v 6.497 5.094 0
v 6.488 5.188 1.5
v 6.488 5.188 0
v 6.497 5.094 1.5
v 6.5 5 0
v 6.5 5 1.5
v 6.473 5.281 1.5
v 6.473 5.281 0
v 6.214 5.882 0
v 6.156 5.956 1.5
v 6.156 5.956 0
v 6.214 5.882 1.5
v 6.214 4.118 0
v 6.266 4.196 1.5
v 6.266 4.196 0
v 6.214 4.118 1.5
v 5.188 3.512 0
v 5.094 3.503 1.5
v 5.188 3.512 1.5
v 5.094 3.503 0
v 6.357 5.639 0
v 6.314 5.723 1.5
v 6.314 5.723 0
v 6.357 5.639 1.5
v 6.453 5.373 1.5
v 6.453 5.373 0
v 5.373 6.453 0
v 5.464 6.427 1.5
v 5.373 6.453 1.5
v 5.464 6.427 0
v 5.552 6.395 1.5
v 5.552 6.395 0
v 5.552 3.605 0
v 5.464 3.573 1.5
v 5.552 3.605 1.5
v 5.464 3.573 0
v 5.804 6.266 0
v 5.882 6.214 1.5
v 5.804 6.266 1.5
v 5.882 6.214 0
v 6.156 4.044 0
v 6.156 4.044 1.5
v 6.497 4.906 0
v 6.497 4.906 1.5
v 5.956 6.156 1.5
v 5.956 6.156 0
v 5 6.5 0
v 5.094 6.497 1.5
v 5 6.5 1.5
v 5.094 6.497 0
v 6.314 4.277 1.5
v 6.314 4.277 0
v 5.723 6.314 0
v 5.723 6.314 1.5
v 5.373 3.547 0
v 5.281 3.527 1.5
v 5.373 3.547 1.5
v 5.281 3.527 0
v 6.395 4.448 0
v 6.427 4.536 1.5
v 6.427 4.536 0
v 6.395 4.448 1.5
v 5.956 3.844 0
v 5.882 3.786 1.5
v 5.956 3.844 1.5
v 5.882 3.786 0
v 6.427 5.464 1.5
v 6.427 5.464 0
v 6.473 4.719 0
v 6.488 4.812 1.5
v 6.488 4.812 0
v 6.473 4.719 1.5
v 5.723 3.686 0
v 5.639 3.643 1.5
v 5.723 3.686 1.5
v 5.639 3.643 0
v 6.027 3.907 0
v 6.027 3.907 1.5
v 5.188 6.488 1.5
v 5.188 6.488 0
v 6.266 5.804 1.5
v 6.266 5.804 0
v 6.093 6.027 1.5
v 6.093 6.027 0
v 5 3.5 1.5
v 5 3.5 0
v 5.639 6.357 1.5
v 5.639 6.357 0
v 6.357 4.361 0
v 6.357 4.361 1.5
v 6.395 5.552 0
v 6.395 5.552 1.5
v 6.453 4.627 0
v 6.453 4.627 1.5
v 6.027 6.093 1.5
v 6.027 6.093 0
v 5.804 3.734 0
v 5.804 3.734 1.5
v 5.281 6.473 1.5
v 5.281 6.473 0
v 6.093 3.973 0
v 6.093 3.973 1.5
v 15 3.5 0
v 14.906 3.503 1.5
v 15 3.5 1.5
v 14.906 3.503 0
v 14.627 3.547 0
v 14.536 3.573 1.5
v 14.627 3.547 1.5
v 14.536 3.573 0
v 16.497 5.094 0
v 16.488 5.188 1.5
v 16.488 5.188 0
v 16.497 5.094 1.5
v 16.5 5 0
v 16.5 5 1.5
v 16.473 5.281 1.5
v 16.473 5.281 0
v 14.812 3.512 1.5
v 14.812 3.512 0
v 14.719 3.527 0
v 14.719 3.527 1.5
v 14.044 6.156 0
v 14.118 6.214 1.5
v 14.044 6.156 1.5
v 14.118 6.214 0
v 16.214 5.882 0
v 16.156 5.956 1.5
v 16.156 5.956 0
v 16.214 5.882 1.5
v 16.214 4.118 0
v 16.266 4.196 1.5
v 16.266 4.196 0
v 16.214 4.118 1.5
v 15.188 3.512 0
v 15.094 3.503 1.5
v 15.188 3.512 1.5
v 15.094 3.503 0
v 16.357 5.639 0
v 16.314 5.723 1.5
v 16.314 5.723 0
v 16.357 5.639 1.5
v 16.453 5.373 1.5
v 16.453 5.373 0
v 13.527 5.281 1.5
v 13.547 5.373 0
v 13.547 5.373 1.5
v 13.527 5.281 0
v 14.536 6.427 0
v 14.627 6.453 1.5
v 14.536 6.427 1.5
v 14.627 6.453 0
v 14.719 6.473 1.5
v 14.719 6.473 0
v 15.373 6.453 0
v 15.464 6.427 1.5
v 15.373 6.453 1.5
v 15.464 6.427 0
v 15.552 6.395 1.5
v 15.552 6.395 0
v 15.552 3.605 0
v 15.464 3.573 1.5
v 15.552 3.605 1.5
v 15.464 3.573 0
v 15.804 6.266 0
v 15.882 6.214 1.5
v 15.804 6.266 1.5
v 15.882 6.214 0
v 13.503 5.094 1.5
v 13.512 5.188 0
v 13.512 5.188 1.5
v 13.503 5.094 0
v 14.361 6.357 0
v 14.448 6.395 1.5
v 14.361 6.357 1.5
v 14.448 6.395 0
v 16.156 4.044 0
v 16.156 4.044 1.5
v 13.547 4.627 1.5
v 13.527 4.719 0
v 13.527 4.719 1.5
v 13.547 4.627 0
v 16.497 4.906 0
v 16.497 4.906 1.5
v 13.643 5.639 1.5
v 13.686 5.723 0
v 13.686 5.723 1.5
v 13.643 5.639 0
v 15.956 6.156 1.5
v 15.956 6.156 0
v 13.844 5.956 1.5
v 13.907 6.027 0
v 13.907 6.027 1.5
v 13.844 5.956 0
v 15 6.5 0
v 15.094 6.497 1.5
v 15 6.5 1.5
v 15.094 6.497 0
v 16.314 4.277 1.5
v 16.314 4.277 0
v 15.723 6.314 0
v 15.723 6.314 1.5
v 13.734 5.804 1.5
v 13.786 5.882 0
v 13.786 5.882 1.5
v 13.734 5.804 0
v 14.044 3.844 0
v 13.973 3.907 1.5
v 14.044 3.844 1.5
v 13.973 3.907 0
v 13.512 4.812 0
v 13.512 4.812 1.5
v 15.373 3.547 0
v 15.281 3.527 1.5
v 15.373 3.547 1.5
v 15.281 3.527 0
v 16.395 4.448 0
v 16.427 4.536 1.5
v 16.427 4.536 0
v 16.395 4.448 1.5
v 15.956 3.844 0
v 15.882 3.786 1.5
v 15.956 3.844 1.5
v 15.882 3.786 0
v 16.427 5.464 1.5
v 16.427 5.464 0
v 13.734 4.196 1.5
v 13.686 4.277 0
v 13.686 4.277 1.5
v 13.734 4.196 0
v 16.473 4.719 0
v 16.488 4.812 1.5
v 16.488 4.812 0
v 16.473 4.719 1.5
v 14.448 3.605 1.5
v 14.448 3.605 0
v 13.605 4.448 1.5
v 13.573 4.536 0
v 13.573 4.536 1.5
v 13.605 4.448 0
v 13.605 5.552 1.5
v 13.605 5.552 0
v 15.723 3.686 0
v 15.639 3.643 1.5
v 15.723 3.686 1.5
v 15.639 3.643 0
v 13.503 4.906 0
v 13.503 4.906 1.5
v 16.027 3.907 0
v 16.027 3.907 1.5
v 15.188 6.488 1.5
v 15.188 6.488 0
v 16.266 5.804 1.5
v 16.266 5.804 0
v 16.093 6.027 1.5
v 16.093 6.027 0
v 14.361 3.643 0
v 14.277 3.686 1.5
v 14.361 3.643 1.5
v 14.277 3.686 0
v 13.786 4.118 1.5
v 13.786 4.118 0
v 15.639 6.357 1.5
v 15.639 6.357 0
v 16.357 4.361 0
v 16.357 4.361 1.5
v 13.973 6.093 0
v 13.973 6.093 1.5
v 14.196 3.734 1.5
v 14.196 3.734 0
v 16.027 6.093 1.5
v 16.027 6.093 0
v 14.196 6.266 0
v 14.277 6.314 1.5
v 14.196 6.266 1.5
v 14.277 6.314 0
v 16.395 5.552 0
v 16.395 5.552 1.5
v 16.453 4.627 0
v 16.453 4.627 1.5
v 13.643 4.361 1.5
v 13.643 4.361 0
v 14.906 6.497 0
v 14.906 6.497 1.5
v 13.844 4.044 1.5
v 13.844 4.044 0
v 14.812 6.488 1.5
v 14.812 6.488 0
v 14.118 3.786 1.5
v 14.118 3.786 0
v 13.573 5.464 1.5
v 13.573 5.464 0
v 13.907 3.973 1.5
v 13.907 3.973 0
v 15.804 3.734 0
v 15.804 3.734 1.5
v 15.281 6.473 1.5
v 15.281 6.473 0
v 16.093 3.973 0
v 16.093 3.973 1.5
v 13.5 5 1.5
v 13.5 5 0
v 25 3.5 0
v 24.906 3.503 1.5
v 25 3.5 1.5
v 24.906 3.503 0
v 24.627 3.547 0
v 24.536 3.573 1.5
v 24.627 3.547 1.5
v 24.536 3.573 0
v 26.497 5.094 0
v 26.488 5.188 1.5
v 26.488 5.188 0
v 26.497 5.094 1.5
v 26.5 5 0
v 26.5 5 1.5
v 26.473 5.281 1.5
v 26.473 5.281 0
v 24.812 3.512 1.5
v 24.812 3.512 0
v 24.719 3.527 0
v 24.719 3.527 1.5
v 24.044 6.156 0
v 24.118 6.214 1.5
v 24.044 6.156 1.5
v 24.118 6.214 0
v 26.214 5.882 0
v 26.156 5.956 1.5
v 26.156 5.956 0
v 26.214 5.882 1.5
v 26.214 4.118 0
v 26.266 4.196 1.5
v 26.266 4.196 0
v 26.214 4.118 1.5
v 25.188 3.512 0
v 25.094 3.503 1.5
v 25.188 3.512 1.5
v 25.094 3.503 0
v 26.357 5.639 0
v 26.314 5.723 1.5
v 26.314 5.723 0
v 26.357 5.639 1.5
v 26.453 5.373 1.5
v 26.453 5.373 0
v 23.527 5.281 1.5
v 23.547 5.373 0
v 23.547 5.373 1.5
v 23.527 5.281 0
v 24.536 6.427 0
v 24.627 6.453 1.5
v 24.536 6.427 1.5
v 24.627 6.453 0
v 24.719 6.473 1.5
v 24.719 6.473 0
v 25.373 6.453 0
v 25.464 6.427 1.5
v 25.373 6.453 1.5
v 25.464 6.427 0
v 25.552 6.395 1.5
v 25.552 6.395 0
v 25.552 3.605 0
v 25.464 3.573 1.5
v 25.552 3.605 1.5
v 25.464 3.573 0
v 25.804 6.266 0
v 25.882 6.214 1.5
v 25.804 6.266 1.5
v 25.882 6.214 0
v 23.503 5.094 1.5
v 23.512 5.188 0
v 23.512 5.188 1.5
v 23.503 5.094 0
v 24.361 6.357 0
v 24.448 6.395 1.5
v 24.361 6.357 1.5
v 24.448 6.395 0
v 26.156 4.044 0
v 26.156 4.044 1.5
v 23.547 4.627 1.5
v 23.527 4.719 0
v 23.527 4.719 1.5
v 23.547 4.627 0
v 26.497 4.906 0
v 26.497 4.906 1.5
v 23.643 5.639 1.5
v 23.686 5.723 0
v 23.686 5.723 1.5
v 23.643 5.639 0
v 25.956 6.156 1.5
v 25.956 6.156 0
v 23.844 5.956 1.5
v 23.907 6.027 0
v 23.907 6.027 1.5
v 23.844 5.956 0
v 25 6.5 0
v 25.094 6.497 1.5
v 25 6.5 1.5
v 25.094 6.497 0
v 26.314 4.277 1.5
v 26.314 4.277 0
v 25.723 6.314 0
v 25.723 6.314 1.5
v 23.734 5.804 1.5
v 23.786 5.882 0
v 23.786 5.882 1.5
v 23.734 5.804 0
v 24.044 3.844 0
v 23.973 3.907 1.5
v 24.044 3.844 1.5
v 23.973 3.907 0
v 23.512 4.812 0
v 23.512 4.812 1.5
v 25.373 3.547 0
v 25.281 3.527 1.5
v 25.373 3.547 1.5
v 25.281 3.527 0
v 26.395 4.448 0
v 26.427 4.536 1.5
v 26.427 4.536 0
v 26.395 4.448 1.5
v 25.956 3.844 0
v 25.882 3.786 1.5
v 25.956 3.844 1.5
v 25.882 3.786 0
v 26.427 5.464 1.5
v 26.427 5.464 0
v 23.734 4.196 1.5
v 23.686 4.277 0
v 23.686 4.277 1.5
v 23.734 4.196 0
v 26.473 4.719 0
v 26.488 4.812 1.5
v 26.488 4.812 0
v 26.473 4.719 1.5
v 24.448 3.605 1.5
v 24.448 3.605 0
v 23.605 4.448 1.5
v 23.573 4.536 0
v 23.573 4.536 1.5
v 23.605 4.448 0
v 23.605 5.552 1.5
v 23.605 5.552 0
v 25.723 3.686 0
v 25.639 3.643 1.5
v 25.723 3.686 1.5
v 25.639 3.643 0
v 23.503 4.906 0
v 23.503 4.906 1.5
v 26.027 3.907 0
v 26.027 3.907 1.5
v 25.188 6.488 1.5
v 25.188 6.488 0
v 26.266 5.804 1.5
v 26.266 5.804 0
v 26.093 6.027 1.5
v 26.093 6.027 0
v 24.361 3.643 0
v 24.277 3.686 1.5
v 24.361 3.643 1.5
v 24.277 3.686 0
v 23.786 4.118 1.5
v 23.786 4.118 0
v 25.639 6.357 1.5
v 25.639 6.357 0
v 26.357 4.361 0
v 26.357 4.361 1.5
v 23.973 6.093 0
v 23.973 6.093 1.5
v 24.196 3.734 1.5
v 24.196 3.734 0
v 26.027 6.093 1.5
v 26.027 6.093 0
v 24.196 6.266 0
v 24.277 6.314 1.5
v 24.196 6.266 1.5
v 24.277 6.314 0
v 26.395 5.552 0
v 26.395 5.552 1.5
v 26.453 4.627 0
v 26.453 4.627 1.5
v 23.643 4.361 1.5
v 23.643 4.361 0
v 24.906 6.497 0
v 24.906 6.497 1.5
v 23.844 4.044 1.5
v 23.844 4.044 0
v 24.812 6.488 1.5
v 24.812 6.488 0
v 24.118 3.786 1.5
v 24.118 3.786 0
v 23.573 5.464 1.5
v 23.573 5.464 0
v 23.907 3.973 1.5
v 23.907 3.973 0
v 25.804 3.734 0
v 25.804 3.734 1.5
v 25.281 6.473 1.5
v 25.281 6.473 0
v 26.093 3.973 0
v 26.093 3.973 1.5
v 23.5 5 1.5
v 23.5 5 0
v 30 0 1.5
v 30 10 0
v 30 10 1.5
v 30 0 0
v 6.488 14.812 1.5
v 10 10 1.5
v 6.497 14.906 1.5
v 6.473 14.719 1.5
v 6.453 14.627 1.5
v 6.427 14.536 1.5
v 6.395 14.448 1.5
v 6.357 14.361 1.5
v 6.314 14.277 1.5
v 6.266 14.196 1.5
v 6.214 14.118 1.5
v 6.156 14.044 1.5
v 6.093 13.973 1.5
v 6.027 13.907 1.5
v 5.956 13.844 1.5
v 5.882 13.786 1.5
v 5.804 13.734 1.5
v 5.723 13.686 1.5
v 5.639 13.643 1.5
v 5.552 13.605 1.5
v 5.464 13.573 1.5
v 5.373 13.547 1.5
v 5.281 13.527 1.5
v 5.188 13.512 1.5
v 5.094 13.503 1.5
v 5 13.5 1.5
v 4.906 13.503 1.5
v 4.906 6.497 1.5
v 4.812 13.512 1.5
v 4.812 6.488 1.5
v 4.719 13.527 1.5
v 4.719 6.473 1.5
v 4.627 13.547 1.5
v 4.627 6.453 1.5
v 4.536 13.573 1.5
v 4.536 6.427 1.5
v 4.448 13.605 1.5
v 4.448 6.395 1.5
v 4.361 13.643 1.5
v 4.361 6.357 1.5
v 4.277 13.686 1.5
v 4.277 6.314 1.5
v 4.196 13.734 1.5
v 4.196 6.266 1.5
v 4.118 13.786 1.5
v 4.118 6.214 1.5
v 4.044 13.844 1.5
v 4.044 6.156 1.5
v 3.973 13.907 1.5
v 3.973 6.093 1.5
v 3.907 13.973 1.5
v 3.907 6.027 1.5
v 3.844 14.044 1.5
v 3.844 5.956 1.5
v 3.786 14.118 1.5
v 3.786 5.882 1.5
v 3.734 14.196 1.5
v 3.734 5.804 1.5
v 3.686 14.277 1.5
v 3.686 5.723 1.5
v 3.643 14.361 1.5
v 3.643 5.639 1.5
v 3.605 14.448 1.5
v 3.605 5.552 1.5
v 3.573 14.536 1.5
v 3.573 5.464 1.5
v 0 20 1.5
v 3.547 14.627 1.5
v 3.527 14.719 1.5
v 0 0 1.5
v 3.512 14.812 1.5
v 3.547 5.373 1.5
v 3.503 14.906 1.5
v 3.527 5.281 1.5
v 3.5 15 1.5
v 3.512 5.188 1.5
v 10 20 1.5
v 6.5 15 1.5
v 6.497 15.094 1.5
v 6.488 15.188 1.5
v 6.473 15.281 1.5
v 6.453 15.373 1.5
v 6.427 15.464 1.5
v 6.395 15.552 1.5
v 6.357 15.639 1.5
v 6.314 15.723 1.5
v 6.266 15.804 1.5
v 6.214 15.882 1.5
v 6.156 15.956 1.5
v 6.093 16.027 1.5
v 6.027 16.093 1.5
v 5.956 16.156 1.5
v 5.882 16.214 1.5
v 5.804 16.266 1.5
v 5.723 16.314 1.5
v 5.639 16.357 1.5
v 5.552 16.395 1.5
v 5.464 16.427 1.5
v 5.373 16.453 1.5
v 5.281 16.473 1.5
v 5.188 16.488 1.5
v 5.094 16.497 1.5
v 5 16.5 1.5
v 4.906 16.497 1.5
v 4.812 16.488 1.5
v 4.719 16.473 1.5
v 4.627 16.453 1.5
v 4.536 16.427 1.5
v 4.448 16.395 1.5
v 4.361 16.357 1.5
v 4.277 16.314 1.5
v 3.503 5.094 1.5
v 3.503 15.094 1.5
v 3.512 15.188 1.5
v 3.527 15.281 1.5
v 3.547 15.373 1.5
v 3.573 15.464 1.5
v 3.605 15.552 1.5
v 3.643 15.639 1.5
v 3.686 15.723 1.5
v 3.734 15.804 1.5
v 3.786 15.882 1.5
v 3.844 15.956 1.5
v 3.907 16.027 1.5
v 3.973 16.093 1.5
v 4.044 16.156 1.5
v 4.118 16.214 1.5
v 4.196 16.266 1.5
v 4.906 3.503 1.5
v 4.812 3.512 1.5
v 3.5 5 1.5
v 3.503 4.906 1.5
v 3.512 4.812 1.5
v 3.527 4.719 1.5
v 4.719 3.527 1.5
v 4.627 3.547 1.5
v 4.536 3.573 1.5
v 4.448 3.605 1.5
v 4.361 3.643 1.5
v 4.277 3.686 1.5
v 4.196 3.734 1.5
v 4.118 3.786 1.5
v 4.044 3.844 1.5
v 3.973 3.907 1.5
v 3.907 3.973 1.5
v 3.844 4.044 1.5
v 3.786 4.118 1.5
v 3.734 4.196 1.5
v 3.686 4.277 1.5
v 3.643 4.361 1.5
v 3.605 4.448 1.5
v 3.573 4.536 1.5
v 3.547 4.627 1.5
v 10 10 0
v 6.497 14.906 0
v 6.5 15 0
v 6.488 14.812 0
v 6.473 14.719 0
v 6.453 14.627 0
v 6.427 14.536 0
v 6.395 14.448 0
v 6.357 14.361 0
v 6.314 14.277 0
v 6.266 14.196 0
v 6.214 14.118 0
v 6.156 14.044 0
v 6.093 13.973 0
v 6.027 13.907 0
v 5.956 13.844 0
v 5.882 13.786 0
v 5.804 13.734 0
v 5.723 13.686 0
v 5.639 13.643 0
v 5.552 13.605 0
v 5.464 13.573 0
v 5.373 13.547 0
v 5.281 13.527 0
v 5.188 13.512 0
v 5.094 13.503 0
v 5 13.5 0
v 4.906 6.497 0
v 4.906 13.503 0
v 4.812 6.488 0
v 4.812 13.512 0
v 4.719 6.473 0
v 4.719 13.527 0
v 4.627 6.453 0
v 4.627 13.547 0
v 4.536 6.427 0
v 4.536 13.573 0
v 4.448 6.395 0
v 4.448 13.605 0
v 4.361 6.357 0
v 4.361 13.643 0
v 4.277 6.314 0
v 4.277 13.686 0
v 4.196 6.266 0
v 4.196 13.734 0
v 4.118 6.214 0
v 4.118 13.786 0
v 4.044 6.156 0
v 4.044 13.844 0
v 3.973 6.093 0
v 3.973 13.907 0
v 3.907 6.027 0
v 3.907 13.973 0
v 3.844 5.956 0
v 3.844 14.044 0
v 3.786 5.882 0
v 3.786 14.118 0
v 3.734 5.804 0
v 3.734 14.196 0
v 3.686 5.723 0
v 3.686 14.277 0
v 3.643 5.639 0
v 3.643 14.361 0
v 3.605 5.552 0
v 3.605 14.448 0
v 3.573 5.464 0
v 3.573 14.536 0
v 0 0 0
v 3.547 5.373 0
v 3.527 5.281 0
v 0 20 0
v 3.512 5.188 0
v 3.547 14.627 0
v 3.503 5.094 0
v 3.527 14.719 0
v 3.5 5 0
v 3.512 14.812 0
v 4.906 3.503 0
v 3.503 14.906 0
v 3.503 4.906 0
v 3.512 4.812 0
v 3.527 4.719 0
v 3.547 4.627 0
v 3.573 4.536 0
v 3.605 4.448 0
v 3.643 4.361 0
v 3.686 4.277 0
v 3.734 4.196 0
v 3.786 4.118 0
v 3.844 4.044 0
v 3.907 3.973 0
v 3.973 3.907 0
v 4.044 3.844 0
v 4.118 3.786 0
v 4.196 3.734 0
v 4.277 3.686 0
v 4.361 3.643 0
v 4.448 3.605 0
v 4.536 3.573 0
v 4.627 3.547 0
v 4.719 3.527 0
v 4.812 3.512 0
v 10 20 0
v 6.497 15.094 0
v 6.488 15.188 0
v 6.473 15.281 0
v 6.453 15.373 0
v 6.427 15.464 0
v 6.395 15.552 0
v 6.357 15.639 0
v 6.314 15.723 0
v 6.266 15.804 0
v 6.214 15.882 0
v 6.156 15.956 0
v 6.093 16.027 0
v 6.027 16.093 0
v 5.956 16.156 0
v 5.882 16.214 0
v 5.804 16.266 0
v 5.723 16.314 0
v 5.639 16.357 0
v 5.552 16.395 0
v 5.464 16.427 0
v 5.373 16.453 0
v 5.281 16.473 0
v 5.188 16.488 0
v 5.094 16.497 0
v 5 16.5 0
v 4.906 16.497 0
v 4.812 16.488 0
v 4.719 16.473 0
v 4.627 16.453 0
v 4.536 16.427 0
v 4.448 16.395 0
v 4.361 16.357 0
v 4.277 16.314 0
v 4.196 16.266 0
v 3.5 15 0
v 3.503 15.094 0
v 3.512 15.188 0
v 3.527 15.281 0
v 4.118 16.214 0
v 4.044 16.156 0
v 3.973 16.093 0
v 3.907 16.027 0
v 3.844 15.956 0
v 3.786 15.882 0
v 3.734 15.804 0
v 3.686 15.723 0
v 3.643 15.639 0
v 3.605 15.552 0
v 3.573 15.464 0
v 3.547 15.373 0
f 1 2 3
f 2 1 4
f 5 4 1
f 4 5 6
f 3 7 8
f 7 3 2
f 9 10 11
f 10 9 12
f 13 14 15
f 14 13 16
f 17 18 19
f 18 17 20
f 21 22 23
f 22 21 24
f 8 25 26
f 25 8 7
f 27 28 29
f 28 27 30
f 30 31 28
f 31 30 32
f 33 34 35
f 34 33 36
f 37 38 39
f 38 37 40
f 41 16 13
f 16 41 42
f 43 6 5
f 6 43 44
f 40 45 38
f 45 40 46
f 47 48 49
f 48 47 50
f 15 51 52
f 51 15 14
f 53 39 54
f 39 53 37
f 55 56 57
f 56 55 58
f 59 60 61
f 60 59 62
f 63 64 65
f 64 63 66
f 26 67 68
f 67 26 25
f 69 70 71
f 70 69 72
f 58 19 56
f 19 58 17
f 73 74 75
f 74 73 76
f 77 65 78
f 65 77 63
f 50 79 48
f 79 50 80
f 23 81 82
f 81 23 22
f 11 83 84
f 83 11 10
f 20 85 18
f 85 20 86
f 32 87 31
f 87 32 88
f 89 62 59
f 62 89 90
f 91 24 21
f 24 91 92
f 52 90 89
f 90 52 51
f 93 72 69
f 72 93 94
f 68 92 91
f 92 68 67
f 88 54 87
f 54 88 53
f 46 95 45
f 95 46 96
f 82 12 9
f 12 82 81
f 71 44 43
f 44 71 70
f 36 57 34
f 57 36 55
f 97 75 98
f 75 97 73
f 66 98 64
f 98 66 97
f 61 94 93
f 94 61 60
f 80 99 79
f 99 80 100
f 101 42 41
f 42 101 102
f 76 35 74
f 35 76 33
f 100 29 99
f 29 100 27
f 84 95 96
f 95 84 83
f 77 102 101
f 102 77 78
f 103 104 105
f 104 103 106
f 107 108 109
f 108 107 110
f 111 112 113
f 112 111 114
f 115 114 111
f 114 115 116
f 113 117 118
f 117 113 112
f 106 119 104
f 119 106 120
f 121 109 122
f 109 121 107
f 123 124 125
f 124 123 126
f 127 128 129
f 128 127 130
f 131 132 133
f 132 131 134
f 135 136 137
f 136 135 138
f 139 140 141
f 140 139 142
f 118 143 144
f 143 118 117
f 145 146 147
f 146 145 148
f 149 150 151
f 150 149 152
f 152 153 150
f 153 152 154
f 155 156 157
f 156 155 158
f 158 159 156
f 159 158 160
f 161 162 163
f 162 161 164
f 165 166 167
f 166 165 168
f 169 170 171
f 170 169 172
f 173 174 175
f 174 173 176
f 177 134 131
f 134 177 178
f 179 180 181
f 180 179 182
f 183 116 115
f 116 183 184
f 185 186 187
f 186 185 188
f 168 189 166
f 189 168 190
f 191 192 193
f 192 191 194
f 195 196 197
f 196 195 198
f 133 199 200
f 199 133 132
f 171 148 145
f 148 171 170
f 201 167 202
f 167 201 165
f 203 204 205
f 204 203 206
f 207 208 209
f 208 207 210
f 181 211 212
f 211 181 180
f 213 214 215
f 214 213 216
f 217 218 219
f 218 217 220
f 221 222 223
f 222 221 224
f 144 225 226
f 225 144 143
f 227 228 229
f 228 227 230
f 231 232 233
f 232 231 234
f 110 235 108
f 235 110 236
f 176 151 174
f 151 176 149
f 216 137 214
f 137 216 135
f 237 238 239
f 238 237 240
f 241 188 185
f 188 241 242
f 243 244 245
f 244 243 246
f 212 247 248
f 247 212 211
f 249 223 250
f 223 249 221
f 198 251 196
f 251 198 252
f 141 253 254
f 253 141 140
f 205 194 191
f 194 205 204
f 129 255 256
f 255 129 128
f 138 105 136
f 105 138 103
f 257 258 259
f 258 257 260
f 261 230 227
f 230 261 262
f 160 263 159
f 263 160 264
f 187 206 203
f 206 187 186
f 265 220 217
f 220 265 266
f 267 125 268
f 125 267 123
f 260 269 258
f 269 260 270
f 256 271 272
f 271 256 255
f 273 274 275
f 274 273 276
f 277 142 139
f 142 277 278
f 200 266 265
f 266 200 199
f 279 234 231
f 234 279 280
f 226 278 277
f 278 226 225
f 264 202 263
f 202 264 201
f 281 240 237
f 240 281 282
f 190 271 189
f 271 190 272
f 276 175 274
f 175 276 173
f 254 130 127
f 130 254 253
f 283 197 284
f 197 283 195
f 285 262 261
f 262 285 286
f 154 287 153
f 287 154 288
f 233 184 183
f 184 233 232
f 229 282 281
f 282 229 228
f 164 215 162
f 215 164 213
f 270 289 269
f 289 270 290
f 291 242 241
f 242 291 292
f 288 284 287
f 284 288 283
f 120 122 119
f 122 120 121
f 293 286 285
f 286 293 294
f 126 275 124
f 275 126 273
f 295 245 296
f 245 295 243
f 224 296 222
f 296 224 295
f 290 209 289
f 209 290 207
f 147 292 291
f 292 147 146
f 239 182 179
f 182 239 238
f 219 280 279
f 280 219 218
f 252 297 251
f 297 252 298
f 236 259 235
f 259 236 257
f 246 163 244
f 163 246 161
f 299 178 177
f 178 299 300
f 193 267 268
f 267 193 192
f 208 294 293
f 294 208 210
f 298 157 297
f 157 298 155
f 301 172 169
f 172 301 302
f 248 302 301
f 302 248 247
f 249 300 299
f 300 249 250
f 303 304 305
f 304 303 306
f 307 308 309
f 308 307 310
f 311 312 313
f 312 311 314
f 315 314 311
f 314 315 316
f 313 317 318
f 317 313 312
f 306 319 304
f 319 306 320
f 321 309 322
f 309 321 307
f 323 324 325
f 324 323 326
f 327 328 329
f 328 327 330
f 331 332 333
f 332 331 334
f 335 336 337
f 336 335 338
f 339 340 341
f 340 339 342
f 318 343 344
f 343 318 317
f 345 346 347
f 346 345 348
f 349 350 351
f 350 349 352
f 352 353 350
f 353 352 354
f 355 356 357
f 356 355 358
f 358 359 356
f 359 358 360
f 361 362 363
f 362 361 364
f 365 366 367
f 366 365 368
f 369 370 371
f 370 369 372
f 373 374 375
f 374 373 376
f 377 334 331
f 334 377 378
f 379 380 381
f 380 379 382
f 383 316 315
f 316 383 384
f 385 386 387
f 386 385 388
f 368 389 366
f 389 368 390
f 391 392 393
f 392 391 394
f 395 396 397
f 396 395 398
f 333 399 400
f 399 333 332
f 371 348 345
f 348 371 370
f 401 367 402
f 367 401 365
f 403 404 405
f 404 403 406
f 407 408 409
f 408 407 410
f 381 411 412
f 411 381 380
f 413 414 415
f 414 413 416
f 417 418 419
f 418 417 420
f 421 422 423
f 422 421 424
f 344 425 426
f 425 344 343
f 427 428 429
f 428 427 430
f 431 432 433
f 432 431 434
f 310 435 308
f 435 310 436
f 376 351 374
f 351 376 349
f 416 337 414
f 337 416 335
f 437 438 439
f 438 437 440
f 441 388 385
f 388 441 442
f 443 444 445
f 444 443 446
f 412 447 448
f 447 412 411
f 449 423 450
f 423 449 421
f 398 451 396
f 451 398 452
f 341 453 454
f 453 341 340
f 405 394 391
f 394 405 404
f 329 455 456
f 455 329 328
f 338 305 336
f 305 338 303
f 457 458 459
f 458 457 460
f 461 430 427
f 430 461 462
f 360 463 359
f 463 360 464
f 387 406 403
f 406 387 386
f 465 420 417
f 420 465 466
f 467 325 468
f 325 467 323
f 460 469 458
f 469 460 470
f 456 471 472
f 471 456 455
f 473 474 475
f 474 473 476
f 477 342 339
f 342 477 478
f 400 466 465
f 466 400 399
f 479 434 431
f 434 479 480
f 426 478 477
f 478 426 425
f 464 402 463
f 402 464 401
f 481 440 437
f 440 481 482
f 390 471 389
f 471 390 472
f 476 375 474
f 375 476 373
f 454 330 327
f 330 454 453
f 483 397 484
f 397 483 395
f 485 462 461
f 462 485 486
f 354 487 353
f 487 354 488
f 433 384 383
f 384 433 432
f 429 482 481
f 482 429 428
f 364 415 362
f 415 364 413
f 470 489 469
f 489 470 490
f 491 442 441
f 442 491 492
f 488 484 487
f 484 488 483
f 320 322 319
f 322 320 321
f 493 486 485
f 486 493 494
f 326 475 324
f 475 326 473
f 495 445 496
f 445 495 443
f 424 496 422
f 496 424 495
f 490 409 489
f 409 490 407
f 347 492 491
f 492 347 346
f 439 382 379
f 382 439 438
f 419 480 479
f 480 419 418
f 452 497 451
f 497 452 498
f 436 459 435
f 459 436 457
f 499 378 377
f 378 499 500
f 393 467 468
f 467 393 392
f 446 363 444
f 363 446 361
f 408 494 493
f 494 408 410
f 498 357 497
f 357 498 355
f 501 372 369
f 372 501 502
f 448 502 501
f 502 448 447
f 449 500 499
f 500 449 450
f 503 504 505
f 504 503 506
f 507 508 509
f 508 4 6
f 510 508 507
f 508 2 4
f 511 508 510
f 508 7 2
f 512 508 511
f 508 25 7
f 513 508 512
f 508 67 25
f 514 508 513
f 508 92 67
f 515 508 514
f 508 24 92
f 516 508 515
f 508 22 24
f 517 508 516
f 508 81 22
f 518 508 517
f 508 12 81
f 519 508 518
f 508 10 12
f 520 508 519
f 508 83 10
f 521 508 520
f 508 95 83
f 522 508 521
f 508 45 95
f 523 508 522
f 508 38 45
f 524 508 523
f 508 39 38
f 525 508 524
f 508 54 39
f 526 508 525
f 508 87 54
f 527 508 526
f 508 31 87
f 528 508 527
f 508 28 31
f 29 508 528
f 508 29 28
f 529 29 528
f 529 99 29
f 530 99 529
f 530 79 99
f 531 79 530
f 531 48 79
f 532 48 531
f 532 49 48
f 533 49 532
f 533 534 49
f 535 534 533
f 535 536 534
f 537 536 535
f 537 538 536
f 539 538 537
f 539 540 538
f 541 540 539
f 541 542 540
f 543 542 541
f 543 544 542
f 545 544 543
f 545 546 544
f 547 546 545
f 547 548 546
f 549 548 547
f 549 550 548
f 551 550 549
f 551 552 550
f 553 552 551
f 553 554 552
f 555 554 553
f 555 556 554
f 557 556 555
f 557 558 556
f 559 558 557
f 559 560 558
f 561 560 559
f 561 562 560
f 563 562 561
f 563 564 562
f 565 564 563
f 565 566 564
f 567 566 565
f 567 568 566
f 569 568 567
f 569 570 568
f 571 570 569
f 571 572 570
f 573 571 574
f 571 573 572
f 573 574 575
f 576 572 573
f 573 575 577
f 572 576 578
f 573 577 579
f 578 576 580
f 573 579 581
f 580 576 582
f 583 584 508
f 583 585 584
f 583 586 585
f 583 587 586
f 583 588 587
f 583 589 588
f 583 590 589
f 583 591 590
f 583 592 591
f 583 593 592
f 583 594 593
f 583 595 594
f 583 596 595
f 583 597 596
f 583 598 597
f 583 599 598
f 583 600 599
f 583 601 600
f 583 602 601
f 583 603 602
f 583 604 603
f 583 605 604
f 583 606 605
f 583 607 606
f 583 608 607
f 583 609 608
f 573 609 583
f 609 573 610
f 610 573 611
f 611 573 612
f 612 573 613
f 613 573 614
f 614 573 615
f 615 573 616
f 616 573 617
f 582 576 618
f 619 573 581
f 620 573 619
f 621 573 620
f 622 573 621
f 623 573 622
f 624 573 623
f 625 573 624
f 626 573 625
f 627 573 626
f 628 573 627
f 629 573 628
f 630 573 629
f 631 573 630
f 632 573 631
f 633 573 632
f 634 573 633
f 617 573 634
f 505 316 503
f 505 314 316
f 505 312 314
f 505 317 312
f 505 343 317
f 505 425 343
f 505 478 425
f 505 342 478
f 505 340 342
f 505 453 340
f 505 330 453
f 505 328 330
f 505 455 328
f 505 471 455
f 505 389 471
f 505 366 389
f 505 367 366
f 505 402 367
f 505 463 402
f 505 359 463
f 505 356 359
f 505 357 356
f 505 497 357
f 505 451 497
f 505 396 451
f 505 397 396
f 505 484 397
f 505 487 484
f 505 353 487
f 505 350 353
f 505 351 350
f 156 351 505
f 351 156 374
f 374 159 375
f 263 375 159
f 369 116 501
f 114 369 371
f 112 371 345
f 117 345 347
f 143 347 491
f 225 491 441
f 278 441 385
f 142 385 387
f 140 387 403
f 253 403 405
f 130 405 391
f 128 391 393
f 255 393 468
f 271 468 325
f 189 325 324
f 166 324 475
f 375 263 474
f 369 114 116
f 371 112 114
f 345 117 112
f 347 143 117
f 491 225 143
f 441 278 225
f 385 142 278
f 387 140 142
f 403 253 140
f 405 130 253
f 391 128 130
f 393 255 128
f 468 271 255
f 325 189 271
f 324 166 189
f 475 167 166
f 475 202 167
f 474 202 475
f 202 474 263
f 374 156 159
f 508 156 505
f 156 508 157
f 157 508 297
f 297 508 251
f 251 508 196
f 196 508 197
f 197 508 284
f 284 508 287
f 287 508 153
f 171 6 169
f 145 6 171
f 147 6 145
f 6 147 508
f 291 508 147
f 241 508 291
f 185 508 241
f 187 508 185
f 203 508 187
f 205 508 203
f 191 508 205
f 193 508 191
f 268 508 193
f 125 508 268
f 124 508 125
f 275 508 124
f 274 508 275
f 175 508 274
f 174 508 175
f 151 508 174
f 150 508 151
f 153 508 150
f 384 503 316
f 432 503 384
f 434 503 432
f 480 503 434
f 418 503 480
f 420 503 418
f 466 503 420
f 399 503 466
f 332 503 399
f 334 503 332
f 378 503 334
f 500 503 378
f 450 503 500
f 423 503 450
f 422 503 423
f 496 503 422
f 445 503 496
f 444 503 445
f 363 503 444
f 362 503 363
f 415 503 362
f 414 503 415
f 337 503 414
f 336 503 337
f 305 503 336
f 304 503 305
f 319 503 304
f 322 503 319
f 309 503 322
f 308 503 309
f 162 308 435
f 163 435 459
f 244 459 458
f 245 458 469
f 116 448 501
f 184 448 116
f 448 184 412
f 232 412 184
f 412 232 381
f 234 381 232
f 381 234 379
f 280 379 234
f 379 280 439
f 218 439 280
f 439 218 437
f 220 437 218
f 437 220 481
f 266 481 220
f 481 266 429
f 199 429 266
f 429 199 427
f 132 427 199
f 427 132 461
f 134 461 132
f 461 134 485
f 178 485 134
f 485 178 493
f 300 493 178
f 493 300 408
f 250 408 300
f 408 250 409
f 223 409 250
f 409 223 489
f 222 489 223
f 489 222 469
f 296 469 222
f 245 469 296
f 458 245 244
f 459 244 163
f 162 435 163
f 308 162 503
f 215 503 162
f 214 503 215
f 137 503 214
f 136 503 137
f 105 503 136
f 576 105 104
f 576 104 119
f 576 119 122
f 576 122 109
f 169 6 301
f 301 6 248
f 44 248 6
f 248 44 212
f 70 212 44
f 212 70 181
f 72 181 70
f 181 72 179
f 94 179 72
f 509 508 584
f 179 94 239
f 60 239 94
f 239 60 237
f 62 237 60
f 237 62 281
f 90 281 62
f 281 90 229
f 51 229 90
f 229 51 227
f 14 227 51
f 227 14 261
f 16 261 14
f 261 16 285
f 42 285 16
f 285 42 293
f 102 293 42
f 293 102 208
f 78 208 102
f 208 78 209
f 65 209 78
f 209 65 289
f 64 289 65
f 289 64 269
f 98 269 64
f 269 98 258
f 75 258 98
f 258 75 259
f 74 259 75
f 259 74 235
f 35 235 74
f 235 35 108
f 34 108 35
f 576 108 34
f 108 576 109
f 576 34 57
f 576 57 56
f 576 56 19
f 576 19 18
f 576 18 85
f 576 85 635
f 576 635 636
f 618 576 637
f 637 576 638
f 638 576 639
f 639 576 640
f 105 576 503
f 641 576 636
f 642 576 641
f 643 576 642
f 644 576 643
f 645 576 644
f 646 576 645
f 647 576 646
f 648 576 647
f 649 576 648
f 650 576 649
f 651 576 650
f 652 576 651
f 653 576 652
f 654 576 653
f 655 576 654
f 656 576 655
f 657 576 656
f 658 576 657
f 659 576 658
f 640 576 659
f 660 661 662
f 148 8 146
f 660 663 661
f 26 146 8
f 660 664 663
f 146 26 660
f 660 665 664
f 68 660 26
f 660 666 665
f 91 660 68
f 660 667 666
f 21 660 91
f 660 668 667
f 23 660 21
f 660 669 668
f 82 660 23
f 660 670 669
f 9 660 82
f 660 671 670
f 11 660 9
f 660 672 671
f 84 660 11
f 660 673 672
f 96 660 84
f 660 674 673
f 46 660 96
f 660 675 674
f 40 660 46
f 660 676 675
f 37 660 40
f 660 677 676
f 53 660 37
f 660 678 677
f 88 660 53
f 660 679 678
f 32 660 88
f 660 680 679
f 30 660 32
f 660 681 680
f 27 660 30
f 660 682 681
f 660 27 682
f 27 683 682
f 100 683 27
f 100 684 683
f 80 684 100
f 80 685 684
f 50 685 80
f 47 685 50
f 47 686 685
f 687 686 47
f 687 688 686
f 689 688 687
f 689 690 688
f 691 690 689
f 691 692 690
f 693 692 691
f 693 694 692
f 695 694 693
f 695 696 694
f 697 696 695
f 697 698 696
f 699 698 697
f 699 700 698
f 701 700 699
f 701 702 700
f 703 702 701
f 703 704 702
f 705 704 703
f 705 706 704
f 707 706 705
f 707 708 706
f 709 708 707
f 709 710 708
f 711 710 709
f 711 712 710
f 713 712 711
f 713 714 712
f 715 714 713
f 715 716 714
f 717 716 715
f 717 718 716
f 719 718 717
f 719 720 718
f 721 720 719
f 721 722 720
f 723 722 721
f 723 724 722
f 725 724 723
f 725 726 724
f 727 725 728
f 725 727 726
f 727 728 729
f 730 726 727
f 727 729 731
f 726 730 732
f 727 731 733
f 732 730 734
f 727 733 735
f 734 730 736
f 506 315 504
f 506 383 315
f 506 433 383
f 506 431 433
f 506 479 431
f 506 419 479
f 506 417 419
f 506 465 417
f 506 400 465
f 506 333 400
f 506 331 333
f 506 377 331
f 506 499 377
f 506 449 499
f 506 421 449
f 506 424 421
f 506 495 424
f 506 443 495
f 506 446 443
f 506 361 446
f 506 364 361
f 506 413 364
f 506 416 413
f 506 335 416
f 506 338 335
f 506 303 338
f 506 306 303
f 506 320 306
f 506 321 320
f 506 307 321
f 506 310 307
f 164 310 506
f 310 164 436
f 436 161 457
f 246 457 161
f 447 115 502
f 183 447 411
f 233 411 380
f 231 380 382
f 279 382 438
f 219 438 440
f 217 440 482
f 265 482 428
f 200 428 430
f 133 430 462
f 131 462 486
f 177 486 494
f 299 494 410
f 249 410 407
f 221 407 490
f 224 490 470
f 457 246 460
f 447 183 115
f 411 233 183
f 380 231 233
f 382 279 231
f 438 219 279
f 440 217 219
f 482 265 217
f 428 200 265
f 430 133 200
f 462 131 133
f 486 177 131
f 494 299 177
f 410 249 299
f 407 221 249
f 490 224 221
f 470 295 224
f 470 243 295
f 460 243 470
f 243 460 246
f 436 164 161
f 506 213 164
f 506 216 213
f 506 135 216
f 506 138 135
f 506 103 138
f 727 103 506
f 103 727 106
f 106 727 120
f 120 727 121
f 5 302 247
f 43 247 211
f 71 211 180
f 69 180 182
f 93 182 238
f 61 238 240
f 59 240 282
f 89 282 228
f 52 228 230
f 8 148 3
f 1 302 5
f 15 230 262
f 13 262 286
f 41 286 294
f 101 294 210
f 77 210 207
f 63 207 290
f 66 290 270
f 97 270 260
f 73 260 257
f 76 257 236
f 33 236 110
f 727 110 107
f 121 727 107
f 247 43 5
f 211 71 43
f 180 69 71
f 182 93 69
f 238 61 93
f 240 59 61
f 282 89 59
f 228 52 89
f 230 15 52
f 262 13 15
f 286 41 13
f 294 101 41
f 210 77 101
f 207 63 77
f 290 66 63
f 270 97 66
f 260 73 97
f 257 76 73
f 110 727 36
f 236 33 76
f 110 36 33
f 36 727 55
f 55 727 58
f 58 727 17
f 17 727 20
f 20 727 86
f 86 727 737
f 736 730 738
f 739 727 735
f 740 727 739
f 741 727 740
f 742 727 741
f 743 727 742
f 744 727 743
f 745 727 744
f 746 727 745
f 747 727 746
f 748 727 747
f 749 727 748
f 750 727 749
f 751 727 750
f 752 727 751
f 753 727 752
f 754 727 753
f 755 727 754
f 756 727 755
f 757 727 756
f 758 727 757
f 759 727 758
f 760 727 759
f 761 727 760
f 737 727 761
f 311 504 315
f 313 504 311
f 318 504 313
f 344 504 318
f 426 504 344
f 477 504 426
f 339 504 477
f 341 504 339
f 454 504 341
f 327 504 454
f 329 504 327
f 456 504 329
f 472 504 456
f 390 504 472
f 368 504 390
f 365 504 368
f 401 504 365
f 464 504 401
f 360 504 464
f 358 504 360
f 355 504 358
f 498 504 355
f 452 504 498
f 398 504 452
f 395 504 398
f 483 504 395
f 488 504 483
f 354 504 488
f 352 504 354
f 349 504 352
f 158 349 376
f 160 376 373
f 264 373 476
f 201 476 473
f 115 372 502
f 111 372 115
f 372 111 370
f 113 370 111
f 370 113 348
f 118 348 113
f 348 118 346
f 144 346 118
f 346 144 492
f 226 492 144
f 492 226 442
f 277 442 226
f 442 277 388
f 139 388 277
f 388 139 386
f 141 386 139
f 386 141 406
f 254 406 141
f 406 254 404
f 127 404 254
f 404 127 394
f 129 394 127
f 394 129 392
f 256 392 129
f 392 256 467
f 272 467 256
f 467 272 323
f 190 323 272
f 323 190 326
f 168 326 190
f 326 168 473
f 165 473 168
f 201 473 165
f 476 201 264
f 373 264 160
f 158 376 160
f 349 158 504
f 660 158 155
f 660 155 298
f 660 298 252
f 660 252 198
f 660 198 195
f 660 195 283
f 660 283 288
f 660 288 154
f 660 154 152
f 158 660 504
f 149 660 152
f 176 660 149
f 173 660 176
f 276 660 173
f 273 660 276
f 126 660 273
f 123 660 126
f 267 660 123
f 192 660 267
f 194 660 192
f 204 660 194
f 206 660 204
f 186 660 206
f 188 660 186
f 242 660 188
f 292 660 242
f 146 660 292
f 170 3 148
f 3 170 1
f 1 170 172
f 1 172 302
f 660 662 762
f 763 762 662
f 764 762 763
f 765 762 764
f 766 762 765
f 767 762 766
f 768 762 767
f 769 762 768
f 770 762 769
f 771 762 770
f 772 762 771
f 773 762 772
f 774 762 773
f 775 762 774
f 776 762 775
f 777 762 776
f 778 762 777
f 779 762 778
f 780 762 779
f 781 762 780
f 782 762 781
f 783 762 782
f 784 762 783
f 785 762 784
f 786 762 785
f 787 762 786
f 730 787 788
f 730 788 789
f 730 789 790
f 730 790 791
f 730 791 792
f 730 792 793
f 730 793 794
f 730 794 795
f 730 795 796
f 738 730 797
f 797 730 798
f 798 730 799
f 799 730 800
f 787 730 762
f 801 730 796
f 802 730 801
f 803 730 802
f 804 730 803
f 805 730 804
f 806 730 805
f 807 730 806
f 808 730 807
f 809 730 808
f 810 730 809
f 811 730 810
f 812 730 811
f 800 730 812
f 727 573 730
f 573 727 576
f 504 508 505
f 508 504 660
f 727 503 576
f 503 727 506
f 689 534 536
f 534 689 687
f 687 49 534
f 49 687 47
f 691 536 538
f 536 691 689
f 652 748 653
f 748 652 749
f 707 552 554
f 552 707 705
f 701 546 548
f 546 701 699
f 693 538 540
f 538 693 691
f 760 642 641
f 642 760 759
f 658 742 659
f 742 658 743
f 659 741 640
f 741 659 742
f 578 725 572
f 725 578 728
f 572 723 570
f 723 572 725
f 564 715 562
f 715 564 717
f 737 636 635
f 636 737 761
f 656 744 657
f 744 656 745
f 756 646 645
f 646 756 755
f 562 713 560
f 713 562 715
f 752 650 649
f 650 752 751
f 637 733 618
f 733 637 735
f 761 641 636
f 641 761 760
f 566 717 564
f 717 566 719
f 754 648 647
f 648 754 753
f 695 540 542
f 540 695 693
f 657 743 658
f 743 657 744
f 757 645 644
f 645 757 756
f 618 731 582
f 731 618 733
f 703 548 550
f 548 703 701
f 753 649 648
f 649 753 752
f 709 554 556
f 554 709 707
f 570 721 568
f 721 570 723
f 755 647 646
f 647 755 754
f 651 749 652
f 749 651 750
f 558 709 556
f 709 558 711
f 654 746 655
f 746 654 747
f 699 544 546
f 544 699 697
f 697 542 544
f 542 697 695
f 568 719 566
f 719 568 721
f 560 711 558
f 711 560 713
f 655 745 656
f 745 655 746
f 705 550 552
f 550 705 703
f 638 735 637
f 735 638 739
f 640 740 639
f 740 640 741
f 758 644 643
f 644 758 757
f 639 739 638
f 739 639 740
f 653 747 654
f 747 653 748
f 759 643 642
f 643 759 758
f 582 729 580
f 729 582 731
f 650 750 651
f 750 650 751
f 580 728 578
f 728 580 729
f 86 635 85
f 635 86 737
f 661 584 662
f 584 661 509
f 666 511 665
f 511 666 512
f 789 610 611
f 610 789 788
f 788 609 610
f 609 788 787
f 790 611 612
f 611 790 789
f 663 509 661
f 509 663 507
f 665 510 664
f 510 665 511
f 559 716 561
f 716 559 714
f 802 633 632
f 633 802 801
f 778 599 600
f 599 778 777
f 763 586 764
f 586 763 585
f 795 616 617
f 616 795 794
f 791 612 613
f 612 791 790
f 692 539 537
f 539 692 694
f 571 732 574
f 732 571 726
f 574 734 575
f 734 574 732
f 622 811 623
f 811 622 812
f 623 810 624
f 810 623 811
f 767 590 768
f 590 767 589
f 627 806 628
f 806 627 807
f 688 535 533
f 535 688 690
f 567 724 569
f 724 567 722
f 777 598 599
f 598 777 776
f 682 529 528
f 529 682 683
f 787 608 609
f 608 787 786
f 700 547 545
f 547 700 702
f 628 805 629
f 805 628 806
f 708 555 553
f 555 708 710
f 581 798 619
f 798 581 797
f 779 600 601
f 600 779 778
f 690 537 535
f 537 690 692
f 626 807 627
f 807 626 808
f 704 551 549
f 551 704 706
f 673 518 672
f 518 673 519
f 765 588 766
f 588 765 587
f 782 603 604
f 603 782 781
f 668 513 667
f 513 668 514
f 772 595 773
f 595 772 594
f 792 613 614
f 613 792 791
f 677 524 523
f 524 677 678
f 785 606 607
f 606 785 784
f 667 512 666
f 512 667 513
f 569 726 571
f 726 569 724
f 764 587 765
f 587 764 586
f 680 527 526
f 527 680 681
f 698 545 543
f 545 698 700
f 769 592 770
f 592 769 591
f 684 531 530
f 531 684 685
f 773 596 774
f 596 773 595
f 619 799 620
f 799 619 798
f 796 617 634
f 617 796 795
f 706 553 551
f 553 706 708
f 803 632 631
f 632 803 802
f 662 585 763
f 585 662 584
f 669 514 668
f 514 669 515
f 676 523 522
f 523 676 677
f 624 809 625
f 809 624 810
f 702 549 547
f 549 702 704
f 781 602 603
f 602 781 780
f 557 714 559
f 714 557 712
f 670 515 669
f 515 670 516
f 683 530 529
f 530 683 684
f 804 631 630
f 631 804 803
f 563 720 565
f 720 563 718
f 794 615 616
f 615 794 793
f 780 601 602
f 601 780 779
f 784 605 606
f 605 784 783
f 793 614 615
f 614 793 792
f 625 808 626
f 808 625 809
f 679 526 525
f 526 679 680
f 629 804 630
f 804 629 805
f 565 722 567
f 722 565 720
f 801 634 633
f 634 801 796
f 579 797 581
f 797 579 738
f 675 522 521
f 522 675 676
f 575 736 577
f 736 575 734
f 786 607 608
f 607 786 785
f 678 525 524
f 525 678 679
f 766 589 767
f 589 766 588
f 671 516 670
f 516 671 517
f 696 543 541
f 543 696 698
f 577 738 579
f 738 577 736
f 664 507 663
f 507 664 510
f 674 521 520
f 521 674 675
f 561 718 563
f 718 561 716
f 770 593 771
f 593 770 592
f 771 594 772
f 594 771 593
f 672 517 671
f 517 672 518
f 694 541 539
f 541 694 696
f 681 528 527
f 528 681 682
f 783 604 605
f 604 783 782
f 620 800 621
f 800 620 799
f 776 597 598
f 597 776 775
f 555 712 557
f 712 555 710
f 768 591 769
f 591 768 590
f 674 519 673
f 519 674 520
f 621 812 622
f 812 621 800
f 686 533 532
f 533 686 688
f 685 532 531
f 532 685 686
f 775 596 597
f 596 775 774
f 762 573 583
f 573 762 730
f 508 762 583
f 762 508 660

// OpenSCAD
// makerbeam 90 degrees angle

width=10;
length1=30;
length2=20;
height=1.5;
tapradius=3/2;
$fn=100;

module tap() {
 translate([width/2,width/2,-height]) cylinder(r=tapradius,h=3*height);
}

module wing1() {
 difference() {
  cube([length1,width,height]);
  union() {
   tap();
   translate([width,0,0]) tap();
   translate([2*width,0,0]) tap();
  }
 }
}

module wing2() {
 difference() {
  cube([length2,width,height]);
  union() {
   tap();
   translate([width,0,0]) tap();
  }
 }
}

module angle() {
 wing1();
 translate([width,0,0]) rotate([0,0,90]) wing2();
}

angle();
